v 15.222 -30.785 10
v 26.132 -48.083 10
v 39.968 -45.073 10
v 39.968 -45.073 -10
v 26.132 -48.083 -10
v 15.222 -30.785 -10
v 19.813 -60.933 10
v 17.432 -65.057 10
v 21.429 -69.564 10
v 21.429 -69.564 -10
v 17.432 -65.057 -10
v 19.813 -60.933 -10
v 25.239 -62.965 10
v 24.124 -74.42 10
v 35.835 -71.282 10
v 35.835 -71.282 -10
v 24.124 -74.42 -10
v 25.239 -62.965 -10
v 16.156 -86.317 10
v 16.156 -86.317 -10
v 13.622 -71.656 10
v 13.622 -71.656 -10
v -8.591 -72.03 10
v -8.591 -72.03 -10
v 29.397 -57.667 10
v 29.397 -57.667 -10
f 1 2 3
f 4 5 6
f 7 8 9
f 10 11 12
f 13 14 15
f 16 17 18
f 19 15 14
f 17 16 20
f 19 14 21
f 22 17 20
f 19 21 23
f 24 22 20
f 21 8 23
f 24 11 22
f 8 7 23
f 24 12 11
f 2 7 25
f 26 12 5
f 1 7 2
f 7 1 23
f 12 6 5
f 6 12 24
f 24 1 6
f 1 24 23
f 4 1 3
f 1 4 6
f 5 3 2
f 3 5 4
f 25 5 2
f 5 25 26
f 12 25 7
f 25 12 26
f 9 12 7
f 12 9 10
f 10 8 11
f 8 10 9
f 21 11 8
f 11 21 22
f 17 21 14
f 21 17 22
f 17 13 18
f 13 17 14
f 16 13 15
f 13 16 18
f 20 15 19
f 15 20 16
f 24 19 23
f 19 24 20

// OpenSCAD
polyhedron(
    points=[
    [-8.59082408685966, -72.0297437973274, 10],
    [15.2216759131403, -30.7852839420936, 10],
    [39.9683518262807, -45.0727839420936, 10],
    [26.1320706581292, -48.0829259131403, 10],
    [29.3974342349666, -57.6671502928731, 10],
    [19.8132098552339, -60.9325138697105, 10],
    [21.428795037862, -69.5642382494432, 10],
    [17.4319598552339, -65.0569598552339, 10],
    [13.6219598552339, -71.6560734320713, 10],
    [24.1244910233854, -74.4201558407573, 10],
    [25.238795037862, -62.9651246726058, 10],
    [35.8347437973274, -71.2824030668152, 10],
    [16.1558518262807, -86.3172437973274, 10],
    [-8.59082408685966, -72.0297437973274, -10],
    [15.2216759131403, -30.7852839420936, -10],
    [39.9683518262807, -45.0727839420936, -10],
    [26.1320706581292, -48.0829259131403, -10],
    [29.3974342349666, -57.6671502928731, -10],
    [19.8132098552339, -60.9325138697105, -10],
    [21.428795037862, -69.5642382494432, -10],
    [17.4319598552339, -65.0569598552339, -10],
    [13.6219598552339, -71.6560734320713, -10],
    [24.1244910233854, -74.4201558407573, -10],
    [25.238795037862, -62.9651246726058, -10],
    [35.8347437973274, -71.2824030668152, -10],
    [16.1558518262807, -86.3172437973274, -10],
    ],
    faces=[
        [2,3,1],
        [14,16,15],
        [6,7,5],
        [18,20,19],
        [11,9,10],
        [23,22,24],
        [9,11,12],
        [25,24,22],
        [8,9,12],
        [25,22,21],
        [0,8,12],
        [25,21,13],
        [0,7,8],
        [21,20,13],
        [0,5,7],
        [20,18,13],
        [4,5,3],
        [16,18,17],
        [3,5,0,1],
        [14,13,18,16],
        [0,13,14,1],
        [1,14,15,2],
        [2,15,16,3],
        [3,16,17,4],
        [4,17,18,5],
        [5,18,19,6],
        [6,19,20,7],
        [7,20,21,8],
        [8,21,22,9],
        [9,22,23,10],
        [10,23,24,11],
        [11,24,25,12],
        [12,25,13,0],
    ]
);
